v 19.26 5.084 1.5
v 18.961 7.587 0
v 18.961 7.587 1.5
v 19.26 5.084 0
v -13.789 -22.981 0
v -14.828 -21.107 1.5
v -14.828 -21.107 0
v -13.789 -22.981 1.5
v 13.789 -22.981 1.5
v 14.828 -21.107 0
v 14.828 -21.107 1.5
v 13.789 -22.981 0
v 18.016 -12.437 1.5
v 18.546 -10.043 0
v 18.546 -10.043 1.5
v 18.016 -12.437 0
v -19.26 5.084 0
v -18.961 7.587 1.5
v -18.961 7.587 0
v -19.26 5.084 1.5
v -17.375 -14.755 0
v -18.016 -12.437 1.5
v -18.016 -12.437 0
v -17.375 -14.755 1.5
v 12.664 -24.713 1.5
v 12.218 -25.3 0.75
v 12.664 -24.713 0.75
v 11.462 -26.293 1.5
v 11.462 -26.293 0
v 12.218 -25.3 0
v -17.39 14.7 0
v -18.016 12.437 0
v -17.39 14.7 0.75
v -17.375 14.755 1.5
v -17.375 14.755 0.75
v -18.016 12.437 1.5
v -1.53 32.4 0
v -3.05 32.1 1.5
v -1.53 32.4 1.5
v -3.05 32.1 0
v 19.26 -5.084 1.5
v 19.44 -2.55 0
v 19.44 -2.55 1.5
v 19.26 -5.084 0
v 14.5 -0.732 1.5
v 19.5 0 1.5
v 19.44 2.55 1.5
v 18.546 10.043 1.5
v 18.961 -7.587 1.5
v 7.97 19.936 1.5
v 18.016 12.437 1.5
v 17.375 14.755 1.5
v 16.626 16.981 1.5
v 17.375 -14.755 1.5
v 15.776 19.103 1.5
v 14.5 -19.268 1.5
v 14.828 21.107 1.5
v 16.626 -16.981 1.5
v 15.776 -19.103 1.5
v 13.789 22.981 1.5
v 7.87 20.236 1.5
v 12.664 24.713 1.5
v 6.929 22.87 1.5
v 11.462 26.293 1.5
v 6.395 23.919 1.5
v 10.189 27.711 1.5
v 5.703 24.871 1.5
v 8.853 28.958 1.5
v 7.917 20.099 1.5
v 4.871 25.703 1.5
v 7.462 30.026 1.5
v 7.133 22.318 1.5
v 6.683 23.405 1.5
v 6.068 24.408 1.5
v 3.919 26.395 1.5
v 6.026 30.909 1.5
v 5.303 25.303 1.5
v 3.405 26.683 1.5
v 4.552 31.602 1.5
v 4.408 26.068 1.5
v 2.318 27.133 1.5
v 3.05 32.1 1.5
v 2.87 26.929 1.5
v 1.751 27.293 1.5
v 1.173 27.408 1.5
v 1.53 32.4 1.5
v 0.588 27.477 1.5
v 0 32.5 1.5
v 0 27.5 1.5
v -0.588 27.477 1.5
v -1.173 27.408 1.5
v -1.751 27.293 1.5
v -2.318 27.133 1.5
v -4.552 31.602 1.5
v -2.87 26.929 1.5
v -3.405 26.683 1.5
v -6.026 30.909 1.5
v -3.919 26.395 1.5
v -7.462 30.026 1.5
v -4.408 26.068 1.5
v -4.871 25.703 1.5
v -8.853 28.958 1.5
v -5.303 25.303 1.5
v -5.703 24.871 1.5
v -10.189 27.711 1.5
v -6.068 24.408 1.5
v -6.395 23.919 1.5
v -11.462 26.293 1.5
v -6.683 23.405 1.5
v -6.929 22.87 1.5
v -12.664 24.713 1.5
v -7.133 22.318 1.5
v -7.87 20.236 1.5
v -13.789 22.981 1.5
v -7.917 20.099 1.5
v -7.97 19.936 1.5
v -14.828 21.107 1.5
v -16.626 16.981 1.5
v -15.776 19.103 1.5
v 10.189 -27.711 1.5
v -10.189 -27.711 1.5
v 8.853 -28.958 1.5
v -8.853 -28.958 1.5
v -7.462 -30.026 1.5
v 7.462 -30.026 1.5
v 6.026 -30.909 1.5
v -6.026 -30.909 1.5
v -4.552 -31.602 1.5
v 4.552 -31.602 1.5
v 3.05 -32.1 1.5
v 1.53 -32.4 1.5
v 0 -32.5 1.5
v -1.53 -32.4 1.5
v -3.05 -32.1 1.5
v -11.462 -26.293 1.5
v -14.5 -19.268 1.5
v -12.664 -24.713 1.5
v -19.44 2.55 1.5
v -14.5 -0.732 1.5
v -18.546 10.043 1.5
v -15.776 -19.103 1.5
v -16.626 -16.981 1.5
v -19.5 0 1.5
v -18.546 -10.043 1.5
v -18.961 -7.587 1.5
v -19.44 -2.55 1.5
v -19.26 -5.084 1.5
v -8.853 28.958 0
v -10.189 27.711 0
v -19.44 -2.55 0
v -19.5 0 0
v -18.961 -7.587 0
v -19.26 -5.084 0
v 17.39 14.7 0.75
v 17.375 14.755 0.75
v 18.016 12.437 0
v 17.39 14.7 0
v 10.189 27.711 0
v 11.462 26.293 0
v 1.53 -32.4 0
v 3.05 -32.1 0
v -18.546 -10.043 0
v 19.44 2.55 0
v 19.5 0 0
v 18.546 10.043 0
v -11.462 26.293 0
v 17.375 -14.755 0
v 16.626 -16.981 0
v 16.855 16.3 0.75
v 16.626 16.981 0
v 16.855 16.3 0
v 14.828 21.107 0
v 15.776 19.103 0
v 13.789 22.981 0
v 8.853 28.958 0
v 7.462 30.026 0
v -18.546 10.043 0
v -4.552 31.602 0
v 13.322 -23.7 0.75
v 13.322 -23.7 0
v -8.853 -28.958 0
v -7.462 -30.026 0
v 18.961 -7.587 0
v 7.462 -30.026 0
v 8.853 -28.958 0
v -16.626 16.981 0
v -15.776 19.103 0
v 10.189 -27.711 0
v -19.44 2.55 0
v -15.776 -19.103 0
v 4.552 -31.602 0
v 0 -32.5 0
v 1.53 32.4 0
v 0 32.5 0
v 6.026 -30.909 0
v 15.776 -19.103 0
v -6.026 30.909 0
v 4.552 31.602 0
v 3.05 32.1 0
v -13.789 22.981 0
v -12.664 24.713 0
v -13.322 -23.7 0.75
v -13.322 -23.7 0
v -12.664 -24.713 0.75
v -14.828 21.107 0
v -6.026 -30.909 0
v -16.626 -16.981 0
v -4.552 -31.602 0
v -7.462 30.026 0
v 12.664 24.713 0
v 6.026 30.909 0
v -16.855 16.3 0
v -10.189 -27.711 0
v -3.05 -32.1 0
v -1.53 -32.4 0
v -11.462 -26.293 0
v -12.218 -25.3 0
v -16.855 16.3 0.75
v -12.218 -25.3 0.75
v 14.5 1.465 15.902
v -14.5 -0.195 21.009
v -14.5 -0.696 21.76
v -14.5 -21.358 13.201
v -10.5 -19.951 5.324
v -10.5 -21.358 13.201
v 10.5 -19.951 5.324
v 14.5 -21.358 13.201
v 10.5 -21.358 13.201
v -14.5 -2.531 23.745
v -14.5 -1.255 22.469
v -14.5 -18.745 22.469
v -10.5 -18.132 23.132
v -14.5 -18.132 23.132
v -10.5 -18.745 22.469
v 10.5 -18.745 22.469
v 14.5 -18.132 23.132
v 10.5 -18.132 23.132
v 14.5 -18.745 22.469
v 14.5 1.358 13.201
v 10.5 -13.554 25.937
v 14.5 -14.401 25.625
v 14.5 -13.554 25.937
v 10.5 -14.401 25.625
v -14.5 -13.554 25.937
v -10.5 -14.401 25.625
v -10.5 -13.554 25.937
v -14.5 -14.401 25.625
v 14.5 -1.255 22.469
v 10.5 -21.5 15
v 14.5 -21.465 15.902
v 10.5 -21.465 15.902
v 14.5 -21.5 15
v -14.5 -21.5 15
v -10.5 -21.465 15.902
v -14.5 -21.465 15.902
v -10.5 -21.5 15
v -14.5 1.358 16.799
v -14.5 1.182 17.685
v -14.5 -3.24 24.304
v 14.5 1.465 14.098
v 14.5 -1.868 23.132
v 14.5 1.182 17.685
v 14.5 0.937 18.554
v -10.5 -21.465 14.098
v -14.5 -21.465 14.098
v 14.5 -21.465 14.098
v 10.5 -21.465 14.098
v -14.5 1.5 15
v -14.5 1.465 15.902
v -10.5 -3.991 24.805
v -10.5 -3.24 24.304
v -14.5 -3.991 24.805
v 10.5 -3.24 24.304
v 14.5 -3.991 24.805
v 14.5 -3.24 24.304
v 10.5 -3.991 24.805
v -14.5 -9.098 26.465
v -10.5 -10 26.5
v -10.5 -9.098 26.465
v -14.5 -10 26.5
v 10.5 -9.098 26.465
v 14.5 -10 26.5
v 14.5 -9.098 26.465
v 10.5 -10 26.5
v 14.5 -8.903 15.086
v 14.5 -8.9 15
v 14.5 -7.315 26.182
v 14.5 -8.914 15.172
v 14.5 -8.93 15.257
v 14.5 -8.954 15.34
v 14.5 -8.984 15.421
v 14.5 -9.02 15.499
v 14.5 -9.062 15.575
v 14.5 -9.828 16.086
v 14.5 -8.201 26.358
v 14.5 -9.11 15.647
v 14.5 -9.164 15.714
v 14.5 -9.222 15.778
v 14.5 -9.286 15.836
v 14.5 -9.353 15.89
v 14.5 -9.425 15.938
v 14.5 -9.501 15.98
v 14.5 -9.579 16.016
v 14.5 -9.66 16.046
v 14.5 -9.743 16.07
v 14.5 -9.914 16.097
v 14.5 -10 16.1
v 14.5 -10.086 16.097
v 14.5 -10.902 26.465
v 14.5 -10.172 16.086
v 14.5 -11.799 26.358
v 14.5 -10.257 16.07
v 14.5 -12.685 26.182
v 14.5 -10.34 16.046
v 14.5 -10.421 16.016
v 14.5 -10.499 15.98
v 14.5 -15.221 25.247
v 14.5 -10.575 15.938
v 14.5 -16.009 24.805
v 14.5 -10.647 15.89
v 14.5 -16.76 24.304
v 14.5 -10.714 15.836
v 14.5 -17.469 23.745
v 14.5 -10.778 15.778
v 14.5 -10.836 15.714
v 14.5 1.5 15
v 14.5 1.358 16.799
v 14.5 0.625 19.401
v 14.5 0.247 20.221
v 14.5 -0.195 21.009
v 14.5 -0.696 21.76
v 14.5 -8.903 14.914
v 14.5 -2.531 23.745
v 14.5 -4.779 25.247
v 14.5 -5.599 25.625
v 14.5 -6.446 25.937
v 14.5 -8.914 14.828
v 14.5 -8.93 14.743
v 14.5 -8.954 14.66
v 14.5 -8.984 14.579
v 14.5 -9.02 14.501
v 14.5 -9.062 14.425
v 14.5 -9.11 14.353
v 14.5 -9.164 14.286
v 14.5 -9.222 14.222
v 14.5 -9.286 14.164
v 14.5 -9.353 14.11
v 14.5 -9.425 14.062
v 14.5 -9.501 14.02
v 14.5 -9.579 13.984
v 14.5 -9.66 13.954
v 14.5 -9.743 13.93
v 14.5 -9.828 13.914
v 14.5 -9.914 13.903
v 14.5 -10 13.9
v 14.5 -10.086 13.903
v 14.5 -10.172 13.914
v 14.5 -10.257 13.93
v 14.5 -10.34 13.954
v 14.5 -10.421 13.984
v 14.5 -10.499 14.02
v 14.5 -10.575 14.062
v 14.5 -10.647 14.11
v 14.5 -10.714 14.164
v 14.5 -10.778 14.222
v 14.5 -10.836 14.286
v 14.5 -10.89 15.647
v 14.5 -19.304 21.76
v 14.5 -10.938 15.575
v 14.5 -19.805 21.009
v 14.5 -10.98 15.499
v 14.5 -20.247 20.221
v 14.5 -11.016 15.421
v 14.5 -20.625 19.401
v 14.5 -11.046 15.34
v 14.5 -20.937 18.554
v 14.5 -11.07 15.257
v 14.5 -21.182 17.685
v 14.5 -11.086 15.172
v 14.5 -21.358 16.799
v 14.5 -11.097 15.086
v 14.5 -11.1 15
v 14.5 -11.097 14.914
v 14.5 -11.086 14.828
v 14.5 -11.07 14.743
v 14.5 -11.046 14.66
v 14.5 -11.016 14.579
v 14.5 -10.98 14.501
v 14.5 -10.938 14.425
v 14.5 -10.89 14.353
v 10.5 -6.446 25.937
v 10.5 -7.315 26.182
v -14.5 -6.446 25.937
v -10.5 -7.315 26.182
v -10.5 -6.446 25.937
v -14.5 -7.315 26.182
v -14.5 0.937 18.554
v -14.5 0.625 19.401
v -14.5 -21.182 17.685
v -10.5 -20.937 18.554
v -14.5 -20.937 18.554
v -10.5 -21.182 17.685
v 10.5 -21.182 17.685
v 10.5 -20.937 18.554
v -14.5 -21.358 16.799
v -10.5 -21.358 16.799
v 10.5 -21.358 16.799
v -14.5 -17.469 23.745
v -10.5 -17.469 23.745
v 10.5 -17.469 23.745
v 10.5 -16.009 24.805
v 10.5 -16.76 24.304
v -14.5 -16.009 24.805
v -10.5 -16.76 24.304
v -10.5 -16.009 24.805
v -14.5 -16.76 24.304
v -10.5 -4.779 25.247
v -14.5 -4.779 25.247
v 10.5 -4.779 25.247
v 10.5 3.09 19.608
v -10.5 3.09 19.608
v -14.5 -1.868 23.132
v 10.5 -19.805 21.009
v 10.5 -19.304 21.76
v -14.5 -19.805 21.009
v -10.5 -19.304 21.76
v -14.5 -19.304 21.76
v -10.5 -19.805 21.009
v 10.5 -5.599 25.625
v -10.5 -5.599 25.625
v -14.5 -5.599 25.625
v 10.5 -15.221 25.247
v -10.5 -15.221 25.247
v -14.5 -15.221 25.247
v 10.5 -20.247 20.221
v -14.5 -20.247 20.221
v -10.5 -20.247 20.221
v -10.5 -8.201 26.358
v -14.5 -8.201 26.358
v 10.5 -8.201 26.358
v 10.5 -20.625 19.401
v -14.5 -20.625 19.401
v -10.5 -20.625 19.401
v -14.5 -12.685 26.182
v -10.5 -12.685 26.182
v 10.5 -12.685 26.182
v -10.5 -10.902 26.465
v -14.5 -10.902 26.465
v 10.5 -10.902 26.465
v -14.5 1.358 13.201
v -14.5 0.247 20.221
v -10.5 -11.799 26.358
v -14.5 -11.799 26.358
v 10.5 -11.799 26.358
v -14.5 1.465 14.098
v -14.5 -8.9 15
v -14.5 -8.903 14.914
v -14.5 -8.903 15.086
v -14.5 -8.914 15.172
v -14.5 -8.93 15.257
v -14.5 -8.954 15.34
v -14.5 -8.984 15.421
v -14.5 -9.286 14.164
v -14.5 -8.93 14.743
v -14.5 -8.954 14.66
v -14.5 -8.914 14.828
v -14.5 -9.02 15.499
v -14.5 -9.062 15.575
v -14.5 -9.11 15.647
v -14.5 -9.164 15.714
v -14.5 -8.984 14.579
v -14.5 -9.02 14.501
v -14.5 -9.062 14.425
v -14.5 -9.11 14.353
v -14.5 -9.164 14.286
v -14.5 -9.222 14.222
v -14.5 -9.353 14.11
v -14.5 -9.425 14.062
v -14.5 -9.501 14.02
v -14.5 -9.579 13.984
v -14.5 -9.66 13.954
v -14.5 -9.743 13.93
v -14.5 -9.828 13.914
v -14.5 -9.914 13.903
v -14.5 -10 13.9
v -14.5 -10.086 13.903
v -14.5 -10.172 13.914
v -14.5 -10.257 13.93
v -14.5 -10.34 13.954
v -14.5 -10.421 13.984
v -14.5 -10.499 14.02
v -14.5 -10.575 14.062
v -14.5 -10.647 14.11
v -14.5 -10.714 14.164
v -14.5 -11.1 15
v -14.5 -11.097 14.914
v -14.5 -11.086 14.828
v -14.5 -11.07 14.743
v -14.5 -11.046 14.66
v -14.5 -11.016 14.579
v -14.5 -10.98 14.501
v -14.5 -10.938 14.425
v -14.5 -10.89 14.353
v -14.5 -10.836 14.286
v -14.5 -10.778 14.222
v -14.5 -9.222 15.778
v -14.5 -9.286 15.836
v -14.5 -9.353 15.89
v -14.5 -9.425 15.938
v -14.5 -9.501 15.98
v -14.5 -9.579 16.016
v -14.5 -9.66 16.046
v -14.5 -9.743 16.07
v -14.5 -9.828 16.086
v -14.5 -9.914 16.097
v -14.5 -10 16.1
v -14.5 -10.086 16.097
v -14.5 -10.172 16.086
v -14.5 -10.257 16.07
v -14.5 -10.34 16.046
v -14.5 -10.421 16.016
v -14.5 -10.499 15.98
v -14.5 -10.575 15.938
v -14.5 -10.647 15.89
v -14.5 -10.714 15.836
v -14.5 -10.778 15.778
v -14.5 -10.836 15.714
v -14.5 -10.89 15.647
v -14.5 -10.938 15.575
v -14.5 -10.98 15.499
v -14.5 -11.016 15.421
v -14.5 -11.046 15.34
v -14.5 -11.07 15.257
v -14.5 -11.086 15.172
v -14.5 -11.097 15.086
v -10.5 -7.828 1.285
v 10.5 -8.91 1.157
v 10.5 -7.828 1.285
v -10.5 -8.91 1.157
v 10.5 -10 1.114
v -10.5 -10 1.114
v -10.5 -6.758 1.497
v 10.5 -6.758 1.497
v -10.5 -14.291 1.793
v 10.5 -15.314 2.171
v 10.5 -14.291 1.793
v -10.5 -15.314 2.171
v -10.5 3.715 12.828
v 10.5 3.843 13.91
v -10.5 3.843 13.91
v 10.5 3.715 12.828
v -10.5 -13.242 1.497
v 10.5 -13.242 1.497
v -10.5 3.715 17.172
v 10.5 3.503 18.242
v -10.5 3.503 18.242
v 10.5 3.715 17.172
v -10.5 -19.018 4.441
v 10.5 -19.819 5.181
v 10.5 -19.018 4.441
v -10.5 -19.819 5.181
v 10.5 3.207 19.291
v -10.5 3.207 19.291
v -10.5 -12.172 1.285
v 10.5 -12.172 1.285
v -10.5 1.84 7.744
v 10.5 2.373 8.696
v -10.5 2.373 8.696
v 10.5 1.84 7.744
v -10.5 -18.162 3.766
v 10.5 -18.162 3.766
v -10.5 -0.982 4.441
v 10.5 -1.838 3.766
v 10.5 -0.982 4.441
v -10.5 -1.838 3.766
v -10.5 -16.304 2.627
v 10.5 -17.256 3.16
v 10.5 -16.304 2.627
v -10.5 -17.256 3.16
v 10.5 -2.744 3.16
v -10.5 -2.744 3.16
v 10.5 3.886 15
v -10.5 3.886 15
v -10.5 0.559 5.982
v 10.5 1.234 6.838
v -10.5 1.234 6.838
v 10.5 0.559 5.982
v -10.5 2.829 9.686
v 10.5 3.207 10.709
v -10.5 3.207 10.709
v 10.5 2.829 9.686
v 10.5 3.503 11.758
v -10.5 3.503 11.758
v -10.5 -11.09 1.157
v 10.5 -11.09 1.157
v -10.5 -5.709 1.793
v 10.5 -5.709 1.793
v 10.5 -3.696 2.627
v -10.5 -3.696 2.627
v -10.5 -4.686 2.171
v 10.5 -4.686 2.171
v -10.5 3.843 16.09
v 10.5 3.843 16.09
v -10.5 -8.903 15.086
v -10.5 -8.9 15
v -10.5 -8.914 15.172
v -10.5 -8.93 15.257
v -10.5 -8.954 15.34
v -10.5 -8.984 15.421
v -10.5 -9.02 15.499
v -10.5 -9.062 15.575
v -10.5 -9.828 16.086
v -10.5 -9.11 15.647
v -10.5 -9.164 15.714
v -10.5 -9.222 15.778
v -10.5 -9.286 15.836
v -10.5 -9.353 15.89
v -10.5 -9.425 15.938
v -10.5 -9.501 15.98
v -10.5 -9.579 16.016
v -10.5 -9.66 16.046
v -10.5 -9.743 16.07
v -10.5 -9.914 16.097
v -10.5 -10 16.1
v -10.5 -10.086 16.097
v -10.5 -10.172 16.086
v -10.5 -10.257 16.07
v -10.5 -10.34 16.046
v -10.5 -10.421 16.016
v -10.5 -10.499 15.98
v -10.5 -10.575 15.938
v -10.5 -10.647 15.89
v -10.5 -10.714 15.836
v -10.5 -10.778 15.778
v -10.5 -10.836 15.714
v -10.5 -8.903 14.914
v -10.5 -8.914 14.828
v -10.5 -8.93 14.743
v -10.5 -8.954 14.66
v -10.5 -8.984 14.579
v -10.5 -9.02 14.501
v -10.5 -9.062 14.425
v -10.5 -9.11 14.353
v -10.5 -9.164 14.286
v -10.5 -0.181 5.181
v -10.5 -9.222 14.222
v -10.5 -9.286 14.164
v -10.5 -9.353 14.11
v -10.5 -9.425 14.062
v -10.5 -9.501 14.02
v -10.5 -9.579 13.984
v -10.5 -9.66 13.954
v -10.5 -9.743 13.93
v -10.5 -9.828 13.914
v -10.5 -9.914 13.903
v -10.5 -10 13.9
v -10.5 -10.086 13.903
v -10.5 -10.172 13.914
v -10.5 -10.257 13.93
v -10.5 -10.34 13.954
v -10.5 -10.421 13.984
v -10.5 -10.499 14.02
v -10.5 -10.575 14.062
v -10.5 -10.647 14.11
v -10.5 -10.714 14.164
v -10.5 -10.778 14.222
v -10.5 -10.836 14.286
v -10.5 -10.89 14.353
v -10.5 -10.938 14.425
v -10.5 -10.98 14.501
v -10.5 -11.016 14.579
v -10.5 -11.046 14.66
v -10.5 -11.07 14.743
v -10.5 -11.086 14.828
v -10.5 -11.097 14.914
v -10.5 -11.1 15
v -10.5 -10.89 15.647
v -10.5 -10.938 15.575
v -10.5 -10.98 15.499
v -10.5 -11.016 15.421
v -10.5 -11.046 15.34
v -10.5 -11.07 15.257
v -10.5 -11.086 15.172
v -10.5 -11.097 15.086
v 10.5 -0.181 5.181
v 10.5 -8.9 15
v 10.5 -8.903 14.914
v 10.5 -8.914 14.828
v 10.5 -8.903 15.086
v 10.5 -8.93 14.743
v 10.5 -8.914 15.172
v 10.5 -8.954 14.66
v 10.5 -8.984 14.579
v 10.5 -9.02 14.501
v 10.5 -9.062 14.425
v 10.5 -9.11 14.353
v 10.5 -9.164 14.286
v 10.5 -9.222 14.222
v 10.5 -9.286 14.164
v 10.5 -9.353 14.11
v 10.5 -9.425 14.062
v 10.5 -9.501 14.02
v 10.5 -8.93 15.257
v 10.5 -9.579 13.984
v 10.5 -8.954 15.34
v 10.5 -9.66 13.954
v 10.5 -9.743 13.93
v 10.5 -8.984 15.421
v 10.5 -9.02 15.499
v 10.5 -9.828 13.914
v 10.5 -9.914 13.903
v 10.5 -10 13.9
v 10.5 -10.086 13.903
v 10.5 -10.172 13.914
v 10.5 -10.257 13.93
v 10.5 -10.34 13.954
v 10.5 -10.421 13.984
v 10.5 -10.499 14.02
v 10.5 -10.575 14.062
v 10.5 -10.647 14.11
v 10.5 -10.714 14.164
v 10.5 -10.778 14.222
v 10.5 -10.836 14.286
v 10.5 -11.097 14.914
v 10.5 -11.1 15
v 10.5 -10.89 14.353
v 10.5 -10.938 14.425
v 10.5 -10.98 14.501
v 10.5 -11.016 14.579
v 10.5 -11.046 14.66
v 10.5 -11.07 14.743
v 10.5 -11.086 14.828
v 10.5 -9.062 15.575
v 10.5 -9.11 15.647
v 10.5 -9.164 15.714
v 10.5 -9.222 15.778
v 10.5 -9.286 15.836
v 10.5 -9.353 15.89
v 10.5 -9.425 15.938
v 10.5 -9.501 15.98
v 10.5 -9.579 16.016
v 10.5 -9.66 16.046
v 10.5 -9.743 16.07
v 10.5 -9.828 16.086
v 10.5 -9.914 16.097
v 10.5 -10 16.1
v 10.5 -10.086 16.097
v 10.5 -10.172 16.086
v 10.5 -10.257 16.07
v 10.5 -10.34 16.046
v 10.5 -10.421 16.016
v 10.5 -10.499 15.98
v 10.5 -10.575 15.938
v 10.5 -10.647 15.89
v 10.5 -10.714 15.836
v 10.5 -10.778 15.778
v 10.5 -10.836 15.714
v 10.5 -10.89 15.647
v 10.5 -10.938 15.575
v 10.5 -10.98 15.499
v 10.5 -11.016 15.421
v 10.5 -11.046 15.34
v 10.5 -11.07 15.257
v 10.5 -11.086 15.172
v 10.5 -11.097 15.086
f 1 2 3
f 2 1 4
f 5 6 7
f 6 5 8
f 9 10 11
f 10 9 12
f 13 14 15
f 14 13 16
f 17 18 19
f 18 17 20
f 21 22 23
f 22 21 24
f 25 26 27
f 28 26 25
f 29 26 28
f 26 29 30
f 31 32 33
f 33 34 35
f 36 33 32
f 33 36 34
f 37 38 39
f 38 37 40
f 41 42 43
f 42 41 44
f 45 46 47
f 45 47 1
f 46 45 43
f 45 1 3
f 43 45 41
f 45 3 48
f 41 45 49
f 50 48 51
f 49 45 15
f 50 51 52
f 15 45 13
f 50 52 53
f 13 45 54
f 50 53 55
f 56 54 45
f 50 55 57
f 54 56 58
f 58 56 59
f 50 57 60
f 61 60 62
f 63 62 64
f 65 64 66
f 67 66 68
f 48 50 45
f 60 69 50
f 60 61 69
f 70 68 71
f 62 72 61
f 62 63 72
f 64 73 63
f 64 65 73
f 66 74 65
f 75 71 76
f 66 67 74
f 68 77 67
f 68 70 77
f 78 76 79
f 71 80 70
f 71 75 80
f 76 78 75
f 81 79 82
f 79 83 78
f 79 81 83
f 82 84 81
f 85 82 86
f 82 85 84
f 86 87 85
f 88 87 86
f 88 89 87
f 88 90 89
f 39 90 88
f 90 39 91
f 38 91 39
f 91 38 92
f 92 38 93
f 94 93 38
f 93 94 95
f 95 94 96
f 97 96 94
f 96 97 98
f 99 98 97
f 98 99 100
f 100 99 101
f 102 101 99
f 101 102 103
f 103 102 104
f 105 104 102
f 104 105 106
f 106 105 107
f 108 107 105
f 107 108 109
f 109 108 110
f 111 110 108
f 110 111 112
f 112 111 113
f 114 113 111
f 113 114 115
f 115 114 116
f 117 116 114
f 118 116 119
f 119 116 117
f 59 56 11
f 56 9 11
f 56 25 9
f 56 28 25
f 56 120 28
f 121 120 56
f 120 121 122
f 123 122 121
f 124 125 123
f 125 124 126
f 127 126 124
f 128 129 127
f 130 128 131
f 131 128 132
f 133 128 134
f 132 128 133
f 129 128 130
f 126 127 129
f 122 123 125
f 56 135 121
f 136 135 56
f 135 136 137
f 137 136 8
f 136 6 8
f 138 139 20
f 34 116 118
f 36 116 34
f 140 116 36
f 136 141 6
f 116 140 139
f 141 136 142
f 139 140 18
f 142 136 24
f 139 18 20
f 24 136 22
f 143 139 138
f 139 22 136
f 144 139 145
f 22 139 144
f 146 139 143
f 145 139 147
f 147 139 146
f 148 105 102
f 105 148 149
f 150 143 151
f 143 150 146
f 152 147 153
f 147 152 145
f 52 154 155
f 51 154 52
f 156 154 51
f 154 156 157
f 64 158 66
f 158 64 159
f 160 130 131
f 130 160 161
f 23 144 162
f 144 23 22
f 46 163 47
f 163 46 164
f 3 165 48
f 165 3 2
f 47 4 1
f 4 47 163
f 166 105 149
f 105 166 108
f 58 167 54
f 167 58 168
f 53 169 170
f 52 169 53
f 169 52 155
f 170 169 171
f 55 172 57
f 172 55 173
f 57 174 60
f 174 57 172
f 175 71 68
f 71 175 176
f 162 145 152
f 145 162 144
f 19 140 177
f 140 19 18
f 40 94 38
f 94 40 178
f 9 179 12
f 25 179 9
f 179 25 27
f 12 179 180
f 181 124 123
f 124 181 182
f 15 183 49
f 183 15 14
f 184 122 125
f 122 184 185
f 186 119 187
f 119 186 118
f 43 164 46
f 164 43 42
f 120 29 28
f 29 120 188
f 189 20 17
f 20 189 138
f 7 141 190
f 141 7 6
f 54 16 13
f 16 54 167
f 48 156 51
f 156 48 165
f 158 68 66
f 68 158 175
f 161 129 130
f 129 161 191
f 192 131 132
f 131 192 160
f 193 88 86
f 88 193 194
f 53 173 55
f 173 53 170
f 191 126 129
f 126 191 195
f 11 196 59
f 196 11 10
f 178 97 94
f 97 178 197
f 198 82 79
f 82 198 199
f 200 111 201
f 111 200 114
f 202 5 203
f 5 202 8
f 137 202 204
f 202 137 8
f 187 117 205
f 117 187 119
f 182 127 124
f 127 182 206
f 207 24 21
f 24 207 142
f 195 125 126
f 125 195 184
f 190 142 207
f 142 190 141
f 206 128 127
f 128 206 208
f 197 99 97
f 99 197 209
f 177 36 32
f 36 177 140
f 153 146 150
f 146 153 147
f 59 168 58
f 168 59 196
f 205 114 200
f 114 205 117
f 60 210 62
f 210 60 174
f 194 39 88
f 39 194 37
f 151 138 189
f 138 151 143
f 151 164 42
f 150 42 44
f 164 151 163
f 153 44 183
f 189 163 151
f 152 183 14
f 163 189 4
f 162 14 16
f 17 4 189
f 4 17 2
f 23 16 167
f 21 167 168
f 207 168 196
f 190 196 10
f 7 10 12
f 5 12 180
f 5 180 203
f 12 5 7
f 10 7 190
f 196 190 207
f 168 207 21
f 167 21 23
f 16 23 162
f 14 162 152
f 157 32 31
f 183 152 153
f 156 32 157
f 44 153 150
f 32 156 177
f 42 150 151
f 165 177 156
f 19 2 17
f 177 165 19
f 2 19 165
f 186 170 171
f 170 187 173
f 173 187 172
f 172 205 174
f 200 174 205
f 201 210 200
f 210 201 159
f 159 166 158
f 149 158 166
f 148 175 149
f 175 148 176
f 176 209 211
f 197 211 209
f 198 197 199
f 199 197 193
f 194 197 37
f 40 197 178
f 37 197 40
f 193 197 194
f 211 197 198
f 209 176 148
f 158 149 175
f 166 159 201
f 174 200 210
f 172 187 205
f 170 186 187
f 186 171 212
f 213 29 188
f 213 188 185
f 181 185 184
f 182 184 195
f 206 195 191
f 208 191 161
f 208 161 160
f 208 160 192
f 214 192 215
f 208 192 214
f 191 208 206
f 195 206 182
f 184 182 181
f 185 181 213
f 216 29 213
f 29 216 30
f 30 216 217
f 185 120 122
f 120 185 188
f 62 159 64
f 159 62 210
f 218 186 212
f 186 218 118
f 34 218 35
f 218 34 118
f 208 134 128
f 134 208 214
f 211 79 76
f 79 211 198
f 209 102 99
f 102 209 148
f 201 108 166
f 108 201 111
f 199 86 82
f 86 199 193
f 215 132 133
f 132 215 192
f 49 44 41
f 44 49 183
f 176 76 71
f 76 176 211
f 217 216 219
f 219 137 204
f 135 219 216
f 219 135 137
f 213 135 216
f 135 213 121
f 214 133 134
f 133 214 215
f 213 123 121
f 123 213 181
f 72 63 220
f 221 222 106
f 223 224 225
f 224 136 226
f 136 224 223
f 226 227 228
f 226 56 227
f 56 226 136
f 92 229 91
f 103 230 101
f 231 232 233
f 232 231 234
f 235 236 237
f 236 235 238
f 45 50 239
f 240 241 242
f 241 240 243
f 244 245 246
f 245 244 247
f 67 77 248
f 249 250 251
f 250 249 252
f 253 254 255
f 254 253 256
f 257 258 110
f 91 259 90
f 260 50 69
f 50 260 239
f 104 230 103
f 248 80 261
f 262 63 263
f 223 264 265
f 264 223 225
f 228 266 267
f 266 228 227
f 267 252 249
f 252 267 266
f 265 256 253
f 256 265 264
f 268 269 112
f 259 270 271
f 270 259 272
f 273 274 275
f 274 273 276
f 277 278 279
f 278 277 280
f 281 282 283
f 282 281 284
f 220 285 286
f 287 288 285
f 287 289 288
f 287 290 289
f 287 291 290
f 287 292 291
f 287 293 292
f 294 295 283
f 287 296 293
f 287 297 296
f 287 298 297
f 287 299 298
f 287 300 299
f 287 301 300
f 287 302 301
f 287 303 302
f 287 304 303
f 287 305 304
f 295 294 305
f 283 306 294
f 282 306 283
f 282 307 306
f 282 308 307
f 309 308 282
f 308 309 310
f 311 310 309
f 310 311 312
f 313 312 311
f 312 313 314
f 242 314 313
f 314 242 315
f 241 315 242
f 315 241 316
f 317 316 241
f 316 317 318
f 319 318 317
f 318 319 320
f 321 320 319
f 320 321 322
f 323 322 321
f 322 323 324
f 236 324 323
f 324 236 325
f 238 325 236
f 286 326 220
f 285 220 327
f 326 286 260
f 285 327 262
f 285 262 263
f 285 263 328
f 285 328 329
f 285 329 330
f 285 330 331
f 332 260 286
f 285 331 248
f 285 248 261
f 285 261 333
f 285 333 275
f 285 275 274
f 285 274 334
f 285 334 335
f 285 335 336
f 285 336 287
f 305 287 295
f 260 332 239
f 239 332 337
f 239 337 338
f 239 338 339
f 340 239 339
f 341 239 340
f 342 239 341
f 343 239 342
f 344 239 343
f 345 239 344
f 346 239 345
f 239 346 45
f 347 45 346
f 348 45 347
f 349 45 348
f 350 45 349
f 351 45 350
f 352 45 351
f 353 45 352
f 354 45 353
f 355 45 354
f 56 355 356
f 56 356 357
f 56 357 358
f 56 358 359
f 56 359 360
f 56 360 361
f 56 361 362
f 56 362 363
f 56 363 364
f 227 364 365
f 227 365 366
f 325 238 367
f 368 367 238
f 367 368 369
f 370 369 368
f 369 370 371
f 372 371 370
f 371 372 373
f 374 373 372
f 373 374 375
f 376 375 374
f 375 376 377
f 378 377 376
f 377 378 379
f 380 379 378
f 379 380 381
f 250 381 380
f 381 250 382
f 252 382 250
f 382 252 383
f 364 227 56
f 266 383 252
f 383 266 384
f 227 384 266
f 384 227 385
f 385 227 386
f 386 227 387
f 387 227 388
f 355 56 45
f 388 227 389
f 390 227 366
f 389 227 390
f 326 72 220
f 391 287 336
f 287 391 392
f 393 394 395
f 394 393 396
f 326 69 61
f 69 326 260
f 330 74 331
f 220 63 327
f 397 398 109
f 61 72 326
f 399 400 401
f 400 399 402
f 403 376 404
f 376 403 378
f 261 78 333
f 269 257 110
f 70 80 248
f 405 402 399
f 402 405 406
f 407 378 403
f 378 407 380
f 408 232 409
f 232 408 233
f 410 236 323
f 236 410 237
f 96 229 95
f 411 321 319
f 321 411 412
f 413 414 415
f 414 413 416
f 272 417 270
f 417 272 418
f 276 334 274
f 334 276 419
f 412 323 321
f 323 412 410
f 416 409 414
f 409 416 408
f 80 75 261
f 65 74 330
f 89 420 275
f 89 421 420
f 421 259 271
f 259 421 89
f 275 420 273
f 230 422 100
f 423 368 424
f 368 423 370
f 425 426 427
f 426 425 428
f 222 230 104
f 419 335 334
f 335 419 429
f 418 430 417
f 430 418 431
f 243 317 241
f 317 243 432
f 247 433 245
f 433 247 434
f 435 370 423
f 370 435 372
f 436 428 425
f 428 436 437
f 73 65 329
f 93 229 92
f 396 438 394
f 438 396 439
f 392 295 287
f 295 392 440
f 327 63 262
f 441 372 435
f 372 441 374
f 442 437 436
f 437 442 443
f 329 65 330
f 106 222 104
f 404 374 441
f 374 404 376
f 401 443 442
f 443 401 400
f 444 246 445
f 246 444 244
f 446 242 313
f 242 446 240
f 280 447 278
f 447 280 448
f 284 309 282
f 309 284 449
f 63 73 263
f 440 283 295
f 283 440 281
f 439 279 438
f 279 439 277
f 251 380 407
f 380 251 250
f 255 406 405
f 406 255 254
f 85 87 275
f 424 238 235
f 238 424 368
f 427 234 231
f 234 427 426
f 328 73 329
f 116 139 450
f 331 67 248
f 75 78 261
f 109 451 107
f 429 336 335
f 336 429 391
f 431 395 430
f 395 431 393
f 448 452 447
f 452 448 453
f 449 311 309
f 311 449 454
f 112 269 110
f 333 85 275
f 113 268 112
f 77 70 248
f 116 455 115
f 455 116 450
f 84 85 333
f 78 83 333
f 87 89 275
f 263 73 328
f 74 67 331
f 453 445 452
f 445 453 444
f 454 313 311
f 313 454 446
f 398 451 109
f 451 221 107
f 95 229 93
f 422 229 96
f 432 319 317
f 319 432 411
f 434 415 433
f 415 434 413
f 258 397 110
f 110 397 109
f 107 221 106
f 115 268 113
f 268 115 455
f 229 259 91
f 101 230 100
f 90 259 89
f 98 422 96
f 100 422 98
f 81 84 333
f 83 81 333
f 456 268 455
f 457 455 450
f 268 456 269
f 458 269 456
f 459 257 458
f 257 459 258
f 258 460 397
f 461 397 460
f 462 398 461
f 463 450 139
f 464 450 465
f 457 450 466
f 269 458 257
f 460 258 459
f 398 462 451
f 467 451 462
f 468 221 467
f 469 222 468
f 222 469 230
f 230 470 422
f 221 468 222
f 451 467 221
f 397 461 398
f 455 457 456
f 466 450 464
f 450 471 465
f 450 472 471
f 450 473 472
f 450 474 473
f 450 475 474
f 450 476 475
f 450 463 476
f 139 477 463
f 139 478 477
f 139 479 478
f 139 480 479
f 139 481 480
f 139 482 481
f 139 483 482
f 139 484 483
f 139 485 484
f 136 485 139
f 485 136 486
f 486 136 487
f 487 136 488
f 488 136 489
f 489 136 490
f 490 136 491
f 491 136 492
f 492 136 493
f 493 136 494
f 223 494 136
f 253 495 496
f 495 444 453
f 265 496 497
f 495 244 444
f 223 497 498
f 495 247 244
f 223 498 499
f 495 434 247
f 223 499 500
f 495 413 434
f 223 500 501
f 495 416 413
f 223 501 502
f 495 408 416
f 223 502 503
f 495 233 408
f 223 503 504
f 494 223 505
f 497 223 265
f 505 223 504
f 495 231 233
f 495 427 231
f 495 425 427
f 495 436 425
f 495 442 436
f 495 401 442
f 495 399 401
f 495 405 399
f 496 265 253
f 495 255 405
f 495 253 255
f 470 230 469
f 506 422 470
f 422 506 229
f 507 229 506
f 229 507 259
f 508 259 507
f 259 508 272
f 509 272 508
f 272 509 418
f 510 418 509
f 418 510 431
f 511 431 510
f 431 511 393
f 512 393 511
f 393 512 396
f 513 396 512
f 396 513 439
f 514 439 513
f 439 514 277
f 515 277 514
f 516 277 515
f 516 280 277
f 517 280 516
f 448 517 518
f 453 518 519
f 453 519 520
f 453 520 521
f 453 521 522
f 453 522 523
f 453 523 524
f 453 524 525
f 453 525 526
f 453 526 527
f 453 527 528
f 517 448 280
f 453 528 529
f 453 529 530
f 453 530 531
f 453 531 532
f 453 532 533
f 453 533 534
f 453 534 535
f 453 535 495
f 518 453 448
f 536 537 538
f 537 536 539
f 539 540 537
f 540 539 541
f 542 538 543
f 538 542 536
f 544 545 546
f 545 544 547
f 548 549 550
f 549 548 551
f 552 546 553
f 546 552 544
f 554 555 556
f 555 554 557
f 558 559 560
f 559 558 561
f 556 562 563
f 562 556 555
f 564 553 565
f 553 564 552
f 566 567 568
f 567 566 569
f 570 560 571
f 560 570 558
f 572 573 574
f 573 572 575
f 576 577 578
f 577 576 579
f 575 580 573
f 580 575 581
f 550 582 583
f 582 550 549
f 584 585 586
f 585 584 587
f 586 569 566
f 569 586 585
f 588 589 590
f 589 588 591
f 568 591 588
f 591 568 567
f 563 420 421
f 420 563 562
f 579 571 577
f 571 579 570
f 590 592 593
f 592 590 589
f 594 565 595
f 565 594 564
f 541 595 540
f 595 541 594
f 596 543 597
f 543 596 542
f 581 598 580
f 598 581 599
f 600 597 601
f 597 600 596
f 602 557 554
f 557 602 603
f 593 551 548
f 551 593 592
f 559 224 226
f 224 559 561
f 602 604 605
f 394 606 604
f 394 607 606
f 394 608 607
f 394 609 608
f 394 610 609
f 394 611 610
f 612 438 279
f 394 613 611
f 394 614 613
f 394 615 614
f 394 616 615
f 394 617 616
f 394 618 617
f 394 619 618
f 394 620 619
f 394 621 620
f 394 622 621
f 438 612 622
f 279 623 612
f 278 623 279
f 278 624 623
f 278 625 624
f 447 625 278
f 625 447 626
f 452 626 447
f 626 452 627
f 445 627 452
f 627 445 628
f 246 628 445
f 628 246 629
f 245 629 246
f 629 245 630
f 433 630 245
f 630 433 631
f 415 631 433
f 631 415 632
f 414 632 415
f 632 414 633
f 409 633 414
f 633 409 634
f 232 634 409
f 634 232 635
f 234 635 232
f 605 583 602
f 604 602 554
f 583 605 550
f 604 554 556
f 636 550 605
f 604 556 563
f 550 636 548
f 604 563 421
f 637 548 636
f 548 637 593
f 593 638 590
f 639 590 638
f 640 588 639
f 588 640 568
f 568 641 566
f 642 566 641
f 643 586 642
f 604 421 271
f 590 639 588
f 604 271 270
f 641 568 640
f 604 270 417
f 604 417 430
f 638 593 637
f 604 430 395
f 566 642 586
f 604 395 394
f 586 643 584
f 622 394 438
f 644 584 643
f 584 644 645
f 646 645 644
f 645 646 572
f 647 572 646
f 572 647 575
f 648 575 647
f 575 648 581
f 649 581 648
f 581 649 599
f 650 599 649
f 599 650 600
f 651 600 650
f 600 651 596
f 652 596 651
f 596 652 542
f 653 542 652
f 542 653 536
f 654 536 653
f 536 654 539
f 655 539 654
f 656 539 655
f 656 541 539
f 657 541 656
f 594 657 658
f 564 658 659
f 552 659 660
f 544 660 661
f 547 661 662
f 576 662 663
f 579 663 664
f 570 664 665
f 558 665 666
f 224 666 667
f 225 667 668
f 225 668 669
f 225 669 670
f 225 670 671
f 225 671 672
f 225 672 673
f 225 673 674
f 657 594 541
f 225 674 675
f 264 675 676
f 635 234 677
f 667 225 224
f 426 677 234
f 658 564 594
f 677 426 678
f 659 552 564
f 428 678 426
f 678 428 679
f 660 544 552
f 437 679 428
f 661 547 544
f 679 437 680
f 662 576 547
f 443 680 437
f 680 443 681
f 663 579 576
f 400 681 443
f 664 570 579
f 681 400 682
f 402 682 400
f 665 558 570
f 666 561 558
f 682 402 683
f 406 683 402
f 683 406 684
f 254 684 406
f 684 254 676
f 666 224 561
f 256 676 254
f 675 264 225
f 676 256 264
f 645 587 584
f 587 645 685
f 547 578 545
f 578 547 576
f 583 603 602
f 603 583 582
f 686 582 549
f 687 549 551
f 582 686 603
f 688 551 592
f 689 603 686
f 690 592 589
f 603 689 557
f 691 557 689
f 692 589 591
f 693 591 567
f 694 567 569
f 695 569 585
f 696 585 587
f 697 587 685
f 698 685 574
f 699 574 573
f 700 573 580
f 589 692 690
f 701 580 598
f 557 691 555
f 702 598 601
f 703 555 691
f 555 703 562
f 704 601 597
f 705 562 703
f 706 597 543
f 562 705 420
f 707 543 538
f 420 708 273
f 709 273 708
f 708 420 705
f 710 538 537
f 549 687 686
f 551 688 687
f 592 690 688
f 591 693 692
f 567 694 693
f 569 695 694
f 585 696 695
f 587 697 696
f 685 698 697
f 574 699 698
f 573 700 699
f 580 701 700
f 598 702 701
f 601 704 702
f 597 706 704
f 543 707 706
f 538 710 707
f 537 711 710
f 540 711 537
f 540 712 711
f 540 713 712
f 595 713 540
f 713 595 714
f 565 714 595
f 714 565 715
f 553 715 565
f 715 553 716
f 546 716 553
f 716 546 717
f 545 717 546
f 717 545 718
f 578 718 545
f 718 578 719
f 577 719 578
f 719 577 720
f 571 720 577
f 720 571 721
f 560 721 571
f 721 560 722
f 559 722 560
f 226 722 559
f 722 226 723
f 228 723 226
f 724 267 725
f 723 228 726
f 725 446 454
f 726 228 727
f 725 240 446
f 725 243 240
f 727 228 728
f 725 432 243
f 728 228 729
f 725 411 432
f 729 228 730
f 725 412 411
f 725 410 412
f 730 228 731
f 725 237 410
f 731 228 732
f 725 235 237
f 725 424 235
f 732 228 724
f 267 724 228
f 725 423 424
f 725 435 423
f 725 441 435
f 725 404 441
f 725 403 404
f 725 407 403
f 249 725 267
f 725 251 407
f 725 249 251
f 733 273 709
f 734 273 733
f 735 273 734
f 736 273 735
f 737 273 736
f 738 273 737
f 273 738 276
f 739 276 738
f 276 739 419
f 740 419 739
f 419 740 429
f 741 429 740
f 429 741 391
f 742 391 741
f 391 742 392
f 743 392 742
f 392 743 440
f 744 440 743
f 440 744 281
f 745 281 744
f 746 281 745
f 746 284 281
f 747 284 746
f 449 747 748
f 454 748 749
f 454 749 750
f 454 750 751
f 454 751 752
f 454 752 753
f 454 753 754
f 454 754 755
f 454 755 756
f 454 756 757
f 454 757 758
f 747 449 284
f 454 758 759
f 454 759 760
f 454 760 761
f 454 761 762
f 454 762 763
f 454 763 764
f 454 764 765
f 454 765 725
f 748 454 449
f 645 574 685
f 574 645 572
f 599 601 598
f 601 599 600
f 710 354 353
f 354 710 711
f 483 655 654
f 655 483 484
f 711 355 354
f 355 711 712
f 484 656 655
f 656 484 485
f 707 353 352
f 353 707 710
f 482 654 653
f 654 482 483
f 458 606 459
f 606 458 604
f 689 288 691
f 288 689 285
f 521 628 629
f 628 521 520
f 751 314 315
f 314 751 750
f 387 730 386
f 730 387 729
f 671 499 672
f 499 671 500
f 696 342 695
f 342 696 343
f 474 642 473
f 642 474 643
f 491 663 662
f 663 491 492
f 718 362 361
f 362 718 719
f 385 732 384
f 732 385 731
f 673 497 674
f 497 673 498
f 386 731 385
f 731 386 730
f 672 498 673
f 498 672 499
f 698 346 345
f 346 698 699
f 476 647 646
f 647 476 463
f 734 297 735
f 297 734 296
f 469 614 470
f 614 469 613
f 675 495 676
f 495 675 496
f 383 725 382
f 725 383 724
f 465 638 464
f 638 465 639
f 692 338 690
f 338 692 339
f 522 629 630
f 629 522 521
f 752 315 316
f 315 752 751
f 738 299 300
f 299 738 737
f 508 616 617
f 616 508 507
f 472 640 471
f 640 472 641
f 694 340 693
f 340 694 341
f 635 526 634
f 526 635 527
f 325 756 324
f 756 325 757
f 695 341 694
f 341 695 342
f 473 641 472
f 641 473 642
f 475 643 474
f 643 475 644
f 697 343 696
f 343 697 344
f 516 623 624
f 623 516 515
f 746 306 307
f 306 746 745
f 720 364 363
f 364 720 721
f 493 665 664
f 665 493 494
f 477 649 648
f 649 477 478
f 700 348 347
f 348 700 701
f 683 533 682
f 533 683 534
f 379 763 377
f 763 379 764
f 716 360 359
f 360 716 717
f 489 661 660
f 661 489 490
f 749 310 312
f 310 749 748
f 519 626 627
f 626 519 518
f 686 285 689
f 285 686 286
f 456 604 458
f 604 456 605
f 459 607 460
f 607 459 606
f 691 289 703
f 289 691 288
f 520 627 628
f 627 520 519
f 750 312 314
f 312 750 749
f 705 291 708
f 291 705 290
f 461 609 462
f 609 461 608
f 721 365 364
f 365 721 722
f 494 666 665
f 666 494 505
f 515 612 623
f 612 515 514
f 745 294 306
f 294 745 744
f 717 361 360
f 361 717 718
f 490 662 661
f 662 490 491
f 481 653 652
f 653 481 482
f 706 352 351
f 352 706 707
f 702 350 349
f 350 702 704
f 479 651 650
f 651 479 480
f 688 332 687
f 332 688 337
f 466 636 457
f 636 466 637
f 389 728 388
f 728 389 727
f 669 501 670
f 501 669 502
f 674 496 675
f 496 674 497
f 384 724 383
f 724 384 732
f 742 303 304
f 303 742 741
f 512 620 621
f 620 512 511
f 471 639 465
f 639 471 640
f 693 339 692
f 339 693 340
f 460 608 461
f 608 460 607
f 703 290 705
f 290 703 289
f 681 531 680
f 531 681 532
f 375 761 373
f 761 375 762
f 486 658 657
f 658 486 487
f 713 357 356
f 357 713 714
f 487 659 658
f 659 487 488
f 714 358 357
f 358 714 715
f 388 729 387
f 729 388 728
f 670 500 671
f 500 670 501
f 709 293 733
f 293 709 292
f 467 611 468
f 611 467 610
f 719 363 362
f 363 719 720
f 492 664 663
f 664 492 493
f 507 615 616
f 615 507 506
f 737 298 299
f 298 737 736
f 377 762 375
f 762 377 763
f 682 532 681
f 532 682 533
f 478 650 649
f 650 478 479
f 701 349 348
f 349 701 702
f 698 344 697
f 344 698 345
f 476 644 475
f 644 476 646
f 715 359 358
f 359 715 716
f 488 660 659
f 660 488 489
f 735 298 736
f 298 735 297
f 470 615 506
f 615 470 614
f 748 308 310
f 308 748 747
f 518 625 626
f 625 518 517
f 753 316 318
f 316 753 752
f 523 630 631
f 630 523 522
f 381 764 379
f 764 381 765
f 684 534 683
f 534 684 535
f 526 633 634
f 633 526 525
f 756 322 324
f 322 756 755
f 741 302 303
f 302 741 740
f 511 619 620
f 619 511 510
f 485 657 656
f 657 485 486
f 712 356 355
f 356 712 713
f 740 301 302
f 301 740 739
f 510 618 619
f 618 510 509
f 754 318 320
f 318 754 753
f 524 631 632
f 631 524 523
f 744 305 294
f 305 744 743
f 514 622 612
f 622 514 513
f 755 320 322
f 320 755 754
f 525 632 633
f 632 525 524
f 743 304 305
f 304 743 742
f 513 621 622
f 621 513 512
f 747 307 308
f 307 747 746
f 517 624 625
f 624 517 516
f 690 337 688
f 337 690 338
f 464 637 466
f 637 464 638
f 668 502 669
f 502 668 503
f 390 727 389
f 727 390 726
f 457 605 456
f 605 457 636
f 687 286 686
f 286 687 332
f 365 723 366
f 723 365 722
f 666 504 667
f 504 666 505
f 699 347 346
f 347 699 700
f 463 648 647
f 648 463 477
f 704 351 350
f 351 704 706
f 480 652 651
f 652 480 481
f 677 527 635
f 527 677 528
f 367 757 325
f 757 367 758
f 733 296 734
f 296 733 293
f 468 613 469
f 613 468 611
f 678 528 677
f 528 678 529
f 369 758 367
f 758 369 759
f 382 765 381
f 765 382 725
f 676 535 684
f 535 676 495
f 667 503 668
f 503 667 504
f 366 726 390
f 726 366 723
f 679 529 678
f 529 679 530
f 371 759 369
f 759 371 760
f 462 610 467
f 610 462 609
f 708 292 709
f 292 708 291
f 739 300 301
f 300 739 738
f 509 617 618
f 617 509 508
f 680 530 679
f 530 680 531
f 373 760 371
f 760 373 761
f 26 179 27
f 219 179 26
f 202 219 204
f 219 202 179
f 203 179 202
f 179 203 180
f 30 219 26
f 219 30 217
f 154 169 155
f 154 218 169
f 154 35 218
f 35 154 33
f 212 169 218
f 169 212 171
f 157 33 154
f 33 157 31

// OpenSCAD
// =============================================================================
// PROJECT: PARAMETRIC FPV WING MOUNT
// VERSION: 1.8 
// DESCRIPTION: Restored trailing edge fairing with universal prism rotation.
//              Optimized for strength and laminar airflow.
// =============================================================================

/* [1. CAMERA DIMENSIONS] */
cam_w           = 19.0;  
cam_h           = 19.0;  
cam_d           = 18.0;  
m2_hole_dia     = 2.2;   
wall_thick      = 4.0;   

/* [2. BASE & POSITIONING] */
base_w          = 39.0;  
base_l          = 65.0;  // Lengthened for the fairing
base_thick      = 1.5;   
base_shift      = -10.0; 
mount_height    = 15.0; 
$fn = 80; 

/* [3. AERO FAIRING SETTINGS] */
// Distance from the axle to the tip of the tail
rear_reach      = 30.0; 
// Width of the very tip of the tail
tip_width       = 15.0;

/* [4. INTERNAL CALCULATIONS] */
corner_radius   = sqrt(pow(cam_d/2, 2) + pow(cam_h/2, 2)); 
safe_swing_r    = corner_radius + 0.8; 
inner_w         = cam_w + 2.0; 
total_width     = inner_w + (wall_thick * 2);

// =============================================================================
// MAIN ASSEMBLY
// =============================================================================

difference() {
    
    // --- STEP 1: THE SOLID BODY ---
    union() {
        // A. THE ELLIPTICAL FLEX-BASE
        scale([base_w/base_l, 1, 1])
            cylinder(h=base_thick, d=base_l, center=false);
        
        // B. THE AERO-PYLON (Shifts with base_shift)
        translate([0, base_shift, 0])
        hull() {
            // The Top Mounting Knuckle (Axle Area)
            translate([0, 0, mount_height])
                rotate([0, 90, 0])
                    cylinder(h=total_width, d=cam_h + 4, center=true);
            
            // Vertical Support Pillar
            translate([0, 0, mount_height/2])
                cube([total_width, cam_d, mount_height], center=true);

            // Trailing Edge Fairing (The "Tail")
            translate([0, rear_reach, 0])
                cylinder(h=base_thick, d=tip_width);
        }
    }

    // --- STEP 2: THE "PRISM-SWING" SUBTRACTION ---
    translate([0, base_shift, mount_height])
    rotate([0, 90, 0]) {
        
        // 1. THE MAIN CLEARANCE DRUM
        cylinder(h=inner_w, r=safe_swing_r, center=true);
        
        // 2. THE AXLE HOLE
        cylinder(h=total_width + 5, d=m2_hole_dia, center=true);
    }

    // --- STEP 3: DYNAMIC FLEX RELIEF SLOTS ---
    for(i = [-base_l/2 + 8 : 10 : base_l/2 - 8]) {
        // Only cut if it's outside the structural footprint of the pylon
        if (i < base_shift - 5 || i > base_shift + rear_reach - 5) {
            translate([0, i, -0.1])
                cube([base_w + 10, 1.6, base_thick + 0.2], center=true);
        }
    }
}
